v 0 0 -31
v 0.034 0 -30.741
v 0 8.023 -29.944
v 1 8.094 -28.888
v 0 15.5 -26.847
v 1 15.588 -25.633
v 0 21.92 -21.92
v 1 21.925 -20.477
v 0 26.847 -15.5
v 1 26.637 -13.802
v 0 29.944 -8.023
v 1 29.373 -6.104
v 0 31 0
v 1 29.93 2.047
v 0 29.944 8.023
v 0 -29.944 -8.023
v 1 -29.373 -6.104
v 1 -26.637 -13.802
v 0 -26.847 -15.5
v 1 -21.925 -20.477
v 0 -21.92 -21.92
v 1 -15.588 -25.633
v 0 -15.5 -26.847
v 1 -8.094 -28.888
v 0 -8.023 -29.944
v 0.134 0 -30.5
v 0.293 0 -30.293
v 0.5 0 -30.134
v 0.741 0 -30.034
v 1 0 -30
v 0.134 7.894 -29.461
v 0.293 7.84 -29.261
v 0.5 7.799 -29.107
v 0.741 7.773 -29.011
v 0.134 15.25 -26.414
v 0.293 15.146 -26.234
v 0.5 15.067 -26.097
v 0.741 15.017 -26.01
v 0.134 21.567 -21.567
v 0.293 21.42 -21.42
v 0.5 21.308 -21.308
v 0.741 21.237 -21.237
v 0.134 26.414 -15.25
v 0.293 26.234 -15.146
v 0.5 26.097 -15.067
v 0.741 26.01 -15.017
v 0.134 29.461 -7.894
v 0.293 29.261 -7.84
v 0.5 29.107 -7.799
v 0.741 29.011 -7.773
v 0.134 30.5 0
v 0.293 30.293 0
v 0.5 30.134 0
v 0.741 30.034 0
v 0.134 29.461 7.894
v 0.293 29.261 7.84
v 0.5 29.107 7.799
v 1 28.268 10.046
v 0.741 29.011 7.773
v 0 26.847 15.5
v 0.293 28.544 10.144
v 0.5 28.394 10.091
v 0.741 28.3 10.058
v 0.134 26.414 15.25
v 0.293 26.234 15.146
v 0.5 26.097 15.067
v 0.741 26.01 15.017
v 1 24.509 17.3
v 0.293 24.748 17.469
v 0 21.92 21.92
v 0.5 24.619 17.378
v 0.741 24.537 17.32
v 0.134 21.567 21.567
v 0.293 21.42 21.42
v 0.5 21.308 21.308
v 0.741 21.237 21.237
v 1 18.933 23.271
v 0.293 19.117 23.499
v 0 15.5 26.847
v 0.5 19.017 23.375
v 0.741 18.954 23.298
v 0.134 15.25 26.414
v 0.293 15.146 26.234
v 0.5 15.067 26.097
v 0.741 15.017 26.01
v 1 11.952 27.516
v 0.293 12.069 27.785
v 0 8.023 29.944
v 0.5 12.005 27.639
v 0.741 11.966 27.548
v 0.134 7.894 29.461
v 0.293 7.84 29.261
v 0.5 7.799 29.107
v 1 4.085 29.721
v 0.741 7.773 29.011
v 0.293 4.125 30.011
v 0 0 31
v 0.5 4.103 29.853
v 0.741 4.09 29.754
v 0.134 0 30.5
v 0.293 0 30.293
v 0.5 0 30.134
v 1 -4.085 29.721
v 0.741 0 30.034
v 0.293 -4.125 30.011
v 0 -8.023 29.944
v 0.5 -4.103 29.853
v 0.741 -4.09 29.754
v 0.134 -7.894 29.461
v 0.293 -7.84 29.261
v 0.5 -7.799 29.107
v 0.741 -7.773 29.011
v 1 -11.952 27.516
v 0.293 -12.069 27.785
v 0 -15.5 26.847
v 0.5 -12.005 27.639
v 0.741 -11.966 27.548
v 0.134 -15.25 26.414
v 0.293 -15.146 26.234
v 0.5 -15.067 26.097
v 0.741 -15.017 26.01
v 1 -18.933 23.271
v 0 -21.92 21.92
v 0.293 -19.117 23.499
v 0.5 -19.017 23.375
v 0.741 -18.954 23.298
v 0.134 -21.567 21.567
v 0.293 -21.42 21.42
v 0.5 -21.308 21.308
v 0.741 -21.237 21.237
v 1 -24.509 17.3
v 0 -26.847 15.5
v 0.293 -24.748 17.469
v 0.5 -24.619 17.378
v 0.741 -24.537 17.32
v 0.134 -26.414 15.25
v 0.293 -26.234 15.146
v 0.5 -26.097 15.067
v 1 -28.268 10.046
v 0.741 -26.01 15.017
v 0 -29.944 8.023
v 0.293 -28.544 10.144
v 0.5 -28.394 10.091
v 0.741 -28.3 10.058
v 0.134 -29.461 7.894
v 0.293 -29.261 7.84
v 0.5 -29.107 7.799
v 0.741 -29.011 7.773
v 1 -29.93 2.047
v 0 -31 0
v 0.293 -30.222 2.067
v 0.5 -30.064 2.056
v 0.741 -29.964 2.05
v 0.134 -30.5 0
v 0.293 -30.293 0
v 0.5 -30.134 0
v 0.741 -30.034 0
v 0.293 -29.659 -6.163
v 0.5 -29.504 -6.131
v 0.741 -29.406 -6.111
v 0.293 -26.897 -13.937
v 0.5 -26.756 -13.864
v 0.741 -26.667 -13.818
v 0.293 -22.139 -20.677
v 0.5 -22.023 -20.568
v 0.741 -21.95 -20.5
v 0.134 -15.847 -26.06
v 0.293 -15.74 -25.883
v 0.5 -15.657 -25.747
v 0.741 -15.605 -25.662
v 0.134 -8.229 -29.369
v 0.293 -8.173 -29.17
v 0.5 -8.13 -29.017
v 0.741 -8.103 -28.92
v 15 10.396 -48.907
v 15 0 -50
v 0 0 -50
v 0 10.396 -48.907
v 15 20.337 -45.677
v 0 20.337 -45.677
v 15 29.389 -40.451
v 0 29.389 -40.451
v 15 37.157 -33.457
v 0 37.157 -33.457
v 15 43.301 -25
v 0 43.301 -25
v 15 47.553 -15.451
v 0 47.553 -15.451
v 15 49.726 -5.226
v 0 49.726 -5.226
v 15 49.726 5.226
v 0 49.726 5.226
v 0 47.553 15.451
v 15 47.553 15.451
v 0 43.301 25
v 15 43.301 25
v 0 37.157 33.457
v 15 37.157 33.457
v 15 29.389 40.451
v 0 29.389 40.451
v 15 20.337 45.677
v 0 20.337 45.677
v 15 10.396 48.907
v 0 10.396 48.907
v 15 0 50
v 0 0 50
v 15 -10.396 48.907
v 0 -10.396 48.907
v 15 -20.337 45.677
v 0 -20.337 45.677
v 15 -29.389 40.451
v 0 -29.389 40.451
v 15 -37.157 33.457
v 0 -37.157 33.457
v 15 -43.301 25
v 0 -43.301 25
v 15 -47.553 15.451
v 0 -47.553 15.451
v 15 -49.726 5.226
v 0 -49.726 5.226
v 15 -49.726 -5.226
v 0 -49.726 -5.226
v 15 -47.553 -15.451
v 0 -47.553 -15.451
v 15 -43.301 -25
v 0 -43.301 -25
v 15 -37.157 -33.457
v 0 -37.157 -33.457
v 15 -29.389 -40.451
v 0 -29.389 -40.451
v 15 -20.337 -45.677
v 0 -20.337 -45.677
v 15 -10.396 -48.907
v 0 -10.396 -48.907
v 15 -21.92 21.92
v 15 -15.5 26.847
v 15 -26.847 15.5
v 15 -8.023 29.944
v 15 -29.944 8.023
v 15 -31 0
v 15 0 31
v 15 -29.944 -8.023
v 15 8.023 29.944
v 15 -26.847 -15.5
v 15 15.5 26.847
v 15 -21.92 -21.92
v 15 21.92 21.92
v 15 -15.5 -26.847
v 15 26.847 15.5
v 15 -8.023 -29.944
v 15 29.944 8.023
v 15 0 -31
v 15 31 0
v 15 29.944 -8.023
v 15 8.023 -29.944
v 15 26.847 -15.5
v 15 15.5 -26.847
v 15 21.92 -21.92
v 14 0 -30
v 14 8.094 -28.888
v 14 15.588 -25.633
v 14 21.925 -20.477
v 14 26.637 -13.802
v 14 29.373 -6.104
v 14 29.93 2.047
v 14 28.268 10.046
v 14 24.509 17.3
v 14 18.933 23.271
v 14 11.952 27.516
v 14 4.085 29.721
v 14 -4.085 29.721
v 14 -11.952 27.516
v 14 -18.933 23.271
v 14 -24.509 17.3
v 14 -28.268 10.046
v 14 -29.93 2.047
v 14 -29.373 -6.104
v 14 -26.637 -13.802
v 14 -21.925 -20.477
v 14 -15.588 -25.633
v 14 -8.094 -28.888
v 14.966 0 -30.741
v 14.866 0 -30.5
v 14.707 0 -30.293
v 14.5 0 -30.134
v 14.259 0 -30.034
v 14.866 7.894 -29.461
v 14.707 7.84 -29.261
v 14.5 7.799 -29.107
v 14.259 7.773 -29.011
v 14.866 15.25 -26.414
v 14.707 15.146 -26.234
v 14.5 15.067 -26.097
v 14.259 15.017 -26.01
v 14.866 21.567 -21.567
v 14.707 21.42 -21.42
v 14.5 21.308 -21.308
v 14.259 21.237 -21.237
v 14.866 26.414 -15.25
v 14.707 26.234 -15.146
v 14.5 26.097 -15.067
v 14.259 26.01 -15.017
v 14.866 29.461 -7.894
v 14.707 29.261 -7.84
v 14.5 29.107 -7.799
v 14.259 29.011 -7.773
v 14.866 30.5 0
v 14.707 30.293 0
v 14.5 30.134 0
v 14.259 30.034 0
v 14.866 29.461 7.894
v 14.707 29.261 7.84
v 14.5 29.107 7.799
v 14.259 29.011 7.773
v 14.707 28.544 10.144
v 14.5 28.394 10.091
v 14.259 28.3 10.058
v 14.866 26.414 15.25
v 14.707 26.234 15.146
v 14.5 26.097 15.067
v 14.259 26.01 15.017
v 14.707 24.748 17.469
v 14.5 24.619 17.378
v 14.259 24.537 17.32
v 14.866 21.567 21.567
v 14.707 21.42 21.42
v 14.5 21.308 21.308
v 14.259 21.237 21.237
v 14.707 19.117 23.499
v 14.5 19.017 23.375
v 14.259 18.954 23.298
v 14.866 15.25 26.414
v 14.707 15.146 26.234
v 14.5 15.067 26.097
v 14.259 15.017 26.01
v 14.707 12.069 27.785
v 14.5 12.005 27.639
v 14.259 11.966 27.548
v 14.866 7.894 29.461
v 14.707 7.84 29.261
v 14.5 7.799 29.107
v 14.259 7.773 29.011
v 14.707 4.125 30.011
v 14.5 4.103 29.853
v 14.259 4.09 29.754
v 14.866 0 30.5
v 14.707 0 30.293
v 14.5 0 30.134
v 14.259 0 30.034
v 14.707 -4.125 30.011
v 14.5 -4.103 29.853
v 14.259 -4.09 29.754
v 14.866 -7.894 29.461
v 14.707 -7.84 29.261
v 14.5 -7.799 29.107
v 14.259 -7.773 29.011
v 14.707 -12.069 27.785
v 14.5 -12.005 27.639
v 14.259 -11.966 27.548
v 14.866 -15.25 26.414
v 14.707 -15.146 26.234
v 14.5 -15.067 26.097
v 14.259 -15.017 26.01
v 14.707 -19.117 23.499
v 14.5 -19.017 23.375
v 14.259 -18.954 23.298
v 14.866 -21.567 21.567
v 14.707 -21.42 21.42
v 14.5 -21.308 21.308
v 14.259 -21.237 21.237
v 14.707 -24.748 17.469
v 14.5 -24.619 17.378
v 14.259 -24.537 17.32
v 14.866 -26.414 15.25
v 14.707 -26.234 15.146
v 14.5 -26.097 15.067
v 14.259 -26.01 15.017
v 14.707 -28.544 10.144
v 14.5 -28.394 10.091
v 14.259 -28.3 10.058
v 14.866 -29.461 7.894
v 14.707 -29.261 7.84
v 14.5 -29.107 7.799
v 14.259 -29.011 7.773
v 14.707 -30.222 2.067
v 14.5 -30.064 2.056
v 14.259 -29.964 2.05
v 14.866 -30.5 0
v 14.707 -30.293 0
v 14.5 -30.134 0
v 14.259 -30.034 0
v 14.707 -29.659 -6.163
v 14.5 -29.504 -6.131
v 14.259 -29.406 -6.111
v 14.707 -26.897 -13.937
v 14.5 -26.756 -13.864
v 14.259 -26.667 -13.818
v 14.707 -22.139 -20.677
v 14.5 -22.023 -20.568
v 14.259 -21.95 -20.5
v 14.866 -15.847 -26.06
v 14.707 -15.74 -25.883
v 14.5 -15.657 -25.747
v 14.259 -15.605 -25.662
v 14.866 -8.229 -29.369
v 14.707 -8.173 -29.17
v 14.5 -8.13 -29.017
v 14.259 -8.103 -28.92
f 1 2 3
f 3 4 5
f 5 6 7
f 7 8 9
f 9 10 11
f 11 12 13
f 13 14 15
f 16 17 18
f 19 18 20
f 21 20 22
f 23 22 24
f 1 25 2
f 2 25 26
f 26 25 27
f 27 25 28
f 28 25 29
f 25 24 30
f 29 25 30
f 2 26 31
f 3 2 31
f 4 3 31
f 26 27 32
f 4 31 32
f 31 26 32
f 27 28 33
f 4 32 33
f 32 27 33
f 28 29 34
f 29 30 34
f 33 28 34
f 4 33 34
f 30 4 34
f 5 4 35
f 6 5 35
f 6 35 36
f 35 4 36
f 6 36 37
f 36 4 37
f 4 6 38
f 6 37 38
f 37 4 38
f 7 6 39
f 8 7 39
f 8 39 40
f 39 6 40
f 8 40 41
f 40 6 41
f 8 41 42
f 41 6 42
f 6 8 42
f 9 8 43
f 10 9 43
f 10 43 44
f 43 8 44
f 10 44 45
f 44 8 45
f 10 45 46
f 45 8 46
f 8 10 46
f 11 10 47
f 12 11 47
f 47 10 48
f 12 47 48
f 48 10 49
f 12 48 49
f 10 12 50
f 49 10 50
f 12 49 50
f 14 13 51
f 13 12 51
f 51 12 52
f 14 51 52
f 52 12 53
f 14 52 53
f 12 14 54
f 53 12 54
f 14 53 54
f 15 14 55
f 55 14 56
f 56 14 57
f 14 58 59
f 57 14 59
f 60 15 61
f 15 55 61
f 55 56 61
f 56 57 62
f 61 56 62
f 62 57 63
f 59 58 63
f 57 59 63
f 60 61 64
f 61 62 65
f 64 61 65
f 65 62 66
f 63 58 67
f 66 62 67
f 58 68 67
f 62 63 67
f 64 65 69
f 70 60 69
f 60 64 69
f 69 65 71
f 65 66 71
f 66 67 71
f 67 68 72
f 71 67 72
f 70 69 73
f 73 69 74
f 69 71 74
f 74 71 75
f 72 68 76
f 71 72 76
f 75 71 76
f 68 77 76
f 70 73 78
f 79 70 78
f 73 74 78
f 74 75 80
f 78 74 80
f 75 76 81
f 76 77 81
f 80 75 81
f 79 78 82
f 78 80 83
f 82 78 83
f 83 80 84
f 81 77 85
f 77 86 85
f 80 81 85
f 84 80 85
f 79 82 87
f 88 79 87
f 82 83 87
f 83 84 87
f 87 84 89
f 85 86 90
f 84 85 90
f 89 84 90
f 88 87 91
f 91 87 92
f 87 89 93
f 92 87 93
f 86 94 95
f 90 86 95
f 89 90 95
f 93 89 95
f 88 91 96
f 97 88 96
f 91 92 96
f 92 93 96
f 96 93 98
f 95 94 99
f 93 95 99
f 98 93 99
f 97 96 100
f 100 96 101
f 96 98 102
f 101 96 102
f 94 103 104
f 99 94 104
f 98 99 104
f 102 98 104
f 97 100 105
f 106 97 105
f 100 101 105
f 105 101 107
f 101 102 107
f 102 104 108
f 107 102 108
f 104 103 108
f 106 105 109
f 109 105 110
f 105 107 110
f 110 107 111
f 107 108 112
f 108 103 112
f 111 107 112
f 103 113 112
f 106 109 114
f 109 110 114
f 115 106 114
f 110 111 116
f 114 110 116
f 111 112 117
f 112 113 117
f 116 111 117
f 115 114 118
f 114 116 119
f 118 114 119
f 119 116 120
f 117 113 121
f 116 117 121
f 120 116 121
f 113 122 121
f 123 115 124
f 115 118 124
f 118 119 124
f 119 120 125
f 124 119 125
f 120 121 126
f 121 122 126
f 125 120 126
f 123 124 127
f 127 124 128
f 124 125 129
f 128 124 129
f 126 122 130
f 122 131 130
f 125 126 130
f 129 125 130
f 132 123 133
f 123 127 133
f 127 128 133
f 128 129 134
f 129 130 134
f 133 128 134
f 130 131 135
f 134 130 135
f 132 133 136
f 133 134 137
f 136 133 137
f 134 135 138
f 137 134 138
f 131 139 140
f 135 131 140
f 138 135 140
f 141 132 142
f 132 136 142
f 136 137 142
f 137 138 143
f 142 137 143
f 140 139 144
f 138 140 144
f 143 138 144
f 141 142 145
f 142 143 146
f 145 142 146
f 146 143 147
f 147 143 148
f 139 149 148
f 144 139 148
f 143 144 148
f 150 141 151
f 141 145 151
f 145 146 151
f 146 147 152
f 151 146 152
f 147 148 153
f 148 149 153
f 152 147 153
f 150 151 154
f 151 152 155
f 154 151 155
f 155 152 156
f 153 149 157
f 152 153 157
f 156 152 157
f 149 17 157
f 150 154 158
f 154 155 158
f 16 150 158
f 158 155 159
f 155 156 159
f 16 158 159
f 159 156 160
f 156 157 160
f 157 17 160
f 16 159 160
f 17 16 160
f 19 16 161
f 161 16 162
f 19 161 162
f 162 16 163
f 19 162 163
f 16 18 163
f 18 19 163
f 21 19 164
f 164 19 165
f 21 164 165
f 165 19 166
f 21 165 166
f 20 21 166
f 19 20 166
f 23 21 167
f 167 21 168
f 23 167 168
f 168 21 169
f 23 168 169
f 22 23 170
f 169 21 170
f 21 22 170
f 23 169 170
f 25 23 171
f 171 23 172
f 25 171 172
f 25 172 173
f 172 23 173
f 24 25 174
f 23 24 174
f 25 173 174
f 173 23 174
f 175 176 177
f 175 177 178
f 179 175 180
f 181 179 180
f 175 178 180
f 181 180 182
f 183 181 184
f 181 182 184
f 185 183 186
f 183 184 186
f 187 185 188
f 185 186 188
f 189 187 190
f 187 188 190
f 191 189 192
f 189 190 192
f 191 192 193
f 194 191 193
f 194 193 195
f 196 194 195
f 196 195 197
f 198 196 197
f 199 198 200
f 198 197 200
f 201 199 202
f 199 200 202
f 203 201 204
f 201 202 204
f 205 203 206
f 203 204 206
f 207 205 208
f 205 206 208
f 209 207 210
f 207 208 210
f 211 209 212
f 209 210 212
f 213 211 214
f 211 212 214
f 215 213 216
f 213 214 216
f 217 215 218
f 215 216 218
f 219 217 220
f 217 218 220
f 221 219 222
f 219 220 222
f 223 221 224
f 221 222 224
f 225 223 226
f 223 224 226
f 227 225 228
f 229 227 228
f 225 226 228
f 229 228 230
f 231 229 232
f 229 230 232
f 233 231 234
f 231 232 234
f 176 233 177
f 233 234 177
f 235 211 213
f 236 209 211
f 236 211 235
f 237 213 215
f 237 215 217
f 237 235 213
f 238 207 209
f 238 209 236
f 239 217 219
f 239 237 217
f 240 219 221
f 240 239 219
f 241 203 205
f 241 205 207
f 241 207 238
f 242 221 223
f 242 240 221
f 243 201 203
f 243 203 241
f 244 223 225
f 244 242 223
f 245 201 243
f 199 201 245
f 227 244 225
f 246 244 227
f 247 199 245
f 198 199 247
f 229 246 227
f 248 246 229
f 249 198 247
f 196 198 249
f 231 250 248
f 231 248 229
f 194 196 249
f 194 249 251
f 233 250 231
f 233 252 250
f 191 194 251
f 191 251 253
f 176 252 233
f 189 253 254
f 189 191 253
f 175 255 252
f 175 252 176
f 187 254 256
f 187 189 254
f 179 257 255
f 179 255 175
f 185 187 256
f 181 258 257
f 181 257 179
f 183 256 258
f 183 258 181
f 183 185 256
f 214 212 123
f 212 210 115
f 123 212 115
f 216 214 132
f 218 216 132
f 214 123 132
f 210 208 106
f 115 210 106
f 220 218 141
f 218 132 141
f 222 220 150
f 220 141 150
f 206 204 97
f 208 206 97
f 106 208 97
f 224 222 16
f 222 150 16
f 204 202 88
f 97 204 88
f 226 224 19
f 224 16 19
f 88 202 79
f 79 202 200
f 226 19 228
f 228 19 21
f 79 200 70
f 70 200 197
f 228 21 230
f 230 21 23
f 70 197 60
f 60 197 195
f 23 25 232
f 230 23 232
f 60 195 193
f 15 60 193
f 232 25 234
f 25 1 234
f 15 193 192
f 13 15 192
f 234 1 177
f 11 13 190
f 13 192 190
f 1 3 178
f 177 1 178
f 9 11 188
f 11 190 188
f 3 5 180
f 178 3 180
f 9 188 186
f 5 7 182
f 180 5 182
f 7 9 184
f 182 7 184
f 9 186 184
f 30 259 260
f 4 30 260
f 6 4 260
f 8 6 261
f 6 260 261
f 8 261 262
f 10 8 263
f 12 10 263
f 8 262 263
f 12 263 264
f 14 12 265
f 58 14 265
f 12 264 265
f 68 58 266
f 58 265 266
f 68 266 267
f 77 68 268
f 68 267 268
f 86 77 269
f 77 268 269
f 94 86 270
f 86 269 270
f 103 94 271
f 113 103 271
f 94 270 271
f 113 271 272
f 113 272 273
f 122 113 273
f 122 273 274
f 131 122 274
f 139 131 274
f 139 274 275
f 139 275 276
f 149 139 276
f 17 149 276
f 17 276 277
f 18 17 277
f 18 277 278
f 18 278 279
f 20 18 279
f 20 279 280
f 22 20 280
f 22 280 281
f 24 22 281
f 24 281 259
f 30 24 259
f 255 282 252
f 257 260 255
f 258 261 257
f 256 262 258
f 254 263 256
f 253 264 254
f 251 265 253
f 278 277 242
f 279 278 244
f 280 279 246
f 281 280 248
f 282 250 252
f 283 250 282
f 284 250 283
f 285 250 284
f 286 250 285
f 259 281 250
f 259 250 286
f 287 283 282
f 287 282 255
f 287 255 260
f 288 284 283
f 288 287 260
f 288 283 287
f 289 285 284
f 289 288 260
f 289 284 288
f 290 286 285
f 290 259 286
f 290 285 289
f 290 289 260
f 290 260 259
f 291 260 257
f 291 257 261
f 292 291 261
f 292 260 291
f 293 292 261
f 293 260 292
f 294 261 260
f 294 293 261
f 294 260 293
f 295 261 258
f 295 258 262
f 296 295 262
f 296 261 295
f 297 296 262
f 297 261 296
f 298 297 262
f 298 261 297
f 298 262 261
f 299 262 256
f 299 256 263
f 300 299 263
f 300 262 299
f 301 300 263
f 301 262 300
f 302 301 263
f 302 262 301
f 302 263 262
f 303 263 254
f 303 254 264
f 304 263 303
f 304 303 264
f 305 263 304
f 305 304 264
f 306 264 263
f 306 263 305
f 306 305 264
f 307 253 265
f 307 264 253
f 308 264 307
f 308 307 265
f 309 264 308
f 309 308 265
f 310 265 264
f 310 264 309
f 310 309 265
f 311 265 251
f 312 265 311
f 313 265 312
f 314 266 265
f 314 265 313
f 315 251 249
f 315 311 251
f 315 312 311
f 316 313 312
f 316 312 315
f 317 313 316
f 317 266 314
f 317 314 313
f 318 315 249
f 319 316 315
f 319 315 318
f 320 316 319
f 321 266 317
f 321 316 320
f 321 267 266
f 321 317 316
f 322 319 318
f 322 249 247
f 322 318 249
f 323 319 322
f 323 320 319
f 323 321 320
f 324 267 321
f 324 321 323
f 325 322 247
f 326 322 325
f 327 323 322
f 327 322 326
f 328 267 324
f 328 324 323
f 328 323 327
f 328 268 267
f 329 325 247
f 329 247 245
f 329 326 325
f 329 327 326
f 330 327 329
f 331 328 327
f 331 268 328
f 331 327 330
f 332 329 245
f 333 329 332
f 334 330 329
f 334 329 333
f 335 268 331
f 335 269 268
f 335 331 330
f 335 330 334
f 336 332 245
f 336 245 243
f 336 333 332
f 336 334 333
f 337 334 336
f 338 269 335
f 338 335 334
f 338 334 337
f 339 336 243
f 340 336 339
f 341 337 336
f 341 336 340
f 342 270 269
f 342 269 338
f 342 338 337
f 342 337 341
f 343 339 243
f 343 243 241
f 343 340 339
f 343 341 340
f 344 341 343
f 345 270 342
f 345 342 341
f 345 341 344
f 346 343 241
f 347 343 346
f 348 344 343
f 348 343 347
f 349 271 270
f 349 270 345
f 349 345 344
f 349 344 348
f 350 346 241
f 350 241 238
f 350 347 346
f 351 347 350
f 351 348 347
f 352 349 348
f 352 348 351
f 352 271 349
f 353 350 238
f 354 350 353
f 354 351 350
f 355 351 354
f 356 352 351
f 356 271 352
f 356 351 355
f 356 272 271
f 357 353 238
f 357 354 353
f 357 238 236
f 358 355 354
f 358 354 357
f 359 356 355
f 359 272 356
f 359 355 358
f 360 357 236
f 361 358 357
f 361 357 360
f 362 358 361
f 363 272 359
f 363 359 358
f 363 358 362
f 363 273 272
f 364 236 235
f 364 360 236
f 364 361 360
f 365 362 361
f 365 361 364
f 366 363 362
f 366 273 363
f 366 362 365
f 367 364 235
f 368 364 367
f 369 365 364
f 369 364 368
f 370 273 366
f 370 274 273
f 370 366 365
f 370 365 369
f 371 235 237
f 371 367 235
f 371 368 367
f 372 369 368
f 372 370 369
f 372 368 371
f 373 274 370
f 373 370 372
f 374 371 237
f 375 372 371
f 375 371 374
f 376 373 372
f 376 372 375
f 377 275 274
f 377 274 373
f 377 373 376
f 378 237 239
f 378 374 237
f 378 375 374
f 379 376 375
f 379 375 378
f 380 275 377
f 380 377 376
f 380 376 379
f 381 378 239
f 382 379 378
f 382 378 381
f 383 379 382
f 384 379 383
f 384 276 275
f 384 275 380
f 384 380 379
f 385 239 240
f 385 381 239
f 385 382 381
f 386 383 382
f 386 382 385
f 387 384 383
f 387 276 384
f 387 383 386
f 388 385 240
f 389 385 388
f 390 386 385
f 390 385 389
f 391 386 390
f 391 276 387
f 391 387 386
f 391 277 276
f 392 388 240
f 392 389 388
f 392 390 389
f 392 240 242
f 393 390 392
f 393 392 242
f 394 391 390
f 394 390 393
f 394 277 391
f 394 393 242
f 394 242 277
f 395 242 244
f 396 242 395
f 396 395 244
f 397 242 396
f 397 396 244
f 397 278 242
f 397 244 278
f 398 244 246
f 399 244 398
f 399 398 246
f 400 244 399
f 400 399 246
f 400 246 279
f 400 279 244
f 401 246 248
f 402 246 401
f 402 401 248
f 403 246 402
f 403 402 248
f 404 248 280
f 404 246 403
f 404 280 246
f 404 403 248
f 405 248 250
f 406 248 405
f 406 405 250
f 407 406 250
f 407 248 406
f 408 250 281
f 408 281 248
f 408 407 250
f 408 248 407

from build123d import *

# Parameters (mm, degrees)
ESBO_O2_R                = 50
RESSALTO_EXTRUS_O1_DEPTH = 15
ESBO_O3_R                = 30
CORTE_EXTRUS_O1_DEPTH    = 73.284161474
FILETE1_R                = 1


with BuildPart() as part:
    # Esboço2 → Ressalto-extrusão1 (new body)
    with BuildSketch(Plane(origin=(0, 0, 0), x_dir=(0, 0, -1), z_dir=(1, 0, 0))):
        Circle(ESBO_O2_R)
    extrude(amount=RESSALTO_EXTRUS_O1_DEPTH)

    # Esboço3 → Corte-extrusão1 (cut, through all)
    with BuildSketch(Plane(origin=(15, 0, 0), x_dir=(0, 0, -1), z_dir=(1, 0, 0))):
        Circle(ESBO_O3_R)
    extrude(amount=-CORTE_EXTRUS_O1_DEPTH, mode=Mode.SUBTRACT)

    # Filete1
    filete1_edges = [part.edges().sort_by_distance(p)[0] for p in [
        (0, 0, 30),
        (15, 0, 30),
    ]]
    fillet(filete1_edges, radius=FILETE1_R)


solid = part.part
